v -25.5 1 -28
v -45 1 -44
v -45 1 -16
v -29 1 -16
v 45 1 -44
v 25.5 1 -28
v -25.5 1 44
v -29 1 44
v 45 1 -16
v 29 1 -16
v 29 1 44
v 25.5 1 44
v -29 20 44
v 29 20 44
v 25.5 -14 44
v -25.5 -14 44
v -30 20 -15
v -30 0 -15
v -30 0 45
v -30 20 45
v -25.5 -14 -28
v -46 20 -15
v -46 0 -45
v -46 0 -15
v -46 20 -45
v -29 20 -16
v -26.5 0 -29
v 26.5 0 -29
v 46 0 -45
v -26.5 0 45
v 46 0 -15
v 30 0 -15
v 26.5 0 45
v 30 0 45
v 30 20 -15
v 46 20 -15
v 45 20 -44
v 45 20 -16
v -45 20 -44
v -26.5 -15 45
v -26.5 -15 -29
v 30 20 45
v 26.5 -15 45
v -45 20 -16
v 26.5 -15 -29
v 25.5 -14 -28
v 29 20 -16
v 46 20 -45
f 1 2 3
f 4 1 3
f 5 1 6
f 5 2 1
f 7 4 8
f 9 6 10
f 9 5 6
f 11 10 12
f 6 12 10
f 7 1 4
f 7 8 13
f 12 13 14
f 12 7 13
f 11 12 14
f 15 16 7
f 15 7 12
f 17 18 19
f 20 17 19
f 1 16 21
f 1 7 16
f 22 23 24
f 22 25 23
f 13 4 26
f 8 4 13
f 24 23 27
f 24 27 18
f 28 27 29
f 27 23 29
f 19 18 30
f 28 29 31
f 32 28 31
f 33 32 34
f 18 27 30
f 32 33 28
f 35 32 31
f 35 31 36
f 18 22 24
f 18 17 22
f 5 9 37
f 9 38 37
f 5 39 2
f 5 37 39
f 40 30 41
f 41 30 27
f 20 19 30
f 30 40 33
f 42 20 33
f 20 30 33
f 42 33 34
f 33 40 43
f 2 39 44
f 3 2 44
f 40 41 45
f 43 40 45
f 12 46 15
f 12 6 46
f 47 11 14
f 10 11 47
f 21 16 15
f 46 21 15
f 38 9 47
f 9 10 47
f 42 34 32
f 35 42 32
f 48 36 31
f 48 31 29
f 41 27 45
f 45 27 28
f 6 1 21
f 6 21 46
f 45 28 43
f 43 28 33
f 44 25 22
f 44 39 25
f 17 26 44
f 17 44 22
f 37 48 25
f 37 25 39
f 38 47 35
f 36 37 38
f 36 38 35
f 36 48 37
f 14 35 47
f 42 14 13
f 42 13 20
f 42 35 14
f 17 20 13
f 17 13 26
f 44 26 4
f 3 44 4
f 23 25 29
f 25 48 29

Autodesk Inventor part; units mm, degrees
ref_plane "YZ Plane" through (0, 0, 0) normal (1, 0, 0) x (0, 1, 0)
ref_plane "XZ Plane" through (0, 0, 0) normal (0, 1, 0) x (-1, 0, 0)
ref_plane "XY Plane" through (0, 0, 0) normal (0, 0, 1) x (1, 0, 0)
sketch "Sketch1" plane through (0, 0, 0) normal (0, 1, 0) x (-1, 0, 0)
  line L0 (30, 45) -> (-30, 45)
  line L1 (-30, 45) -> (-30, -45)
  line L2 (-30, -45) -> (30, -45)
  line L3 (30, -45) -> (30, 45)
  line L4 (30, 45) -> (-30, -45) construction
  line L5 (-30, 45) -> (30, -45) construction
  point P0 (0, 0)
  dimension "d0" = 90
  dimension "d1" = 60
extrude "Extrusion1" add sketch "Sketch1" along normal blind 20
sketch "Sketch2" plane through (0, 0, 0) normal (0, -1, 0) x (1, 0, 0)
  line L0 (26.5, 45) -> (-26.5, 45)
  line L1 (-26.5, 45) -> (-26.5, -29)
  line L2 (-26.5, -29) -> (26.5, -29)
  line L3 (26.5, -29) -> (26.5, 45)
  line L4 (-30, 45) -> (30, 45) projected
  point P0 (0, 0)
  dimension "d4" = 74
  dimension "d5" = 0
  dimension "d6" = 53
  dimension "d7" = 26.5
extrude "Extrusion2" add sketch "Sketch2" along normal blind 15
sketch "Sketch3" plane through (30, 0, 45) normal (1, 0, 0) x (0, 0, -1)
  line L0 (0, 0) -> (90, 0) projected
  line L1 (90, 0) -> (90, 20) projected
  line L2 (0, 20) -> (90, 20) projected
  line L3 (0, 0) -> (0, 20) projected
  line L4 (90, 0) -> (60, 0)
  line L5 (60, 0) -> (60, 20)
  line L6 (60, 20) -> (90, 20)
  line L7 (90, 20) -> (90, 0)
  point P0 (45, 0)
  dimension "d10" = 30
extrude "Extrusion3" add sketch "Sketch3" along normal blind 16 contours L5 L2 L1 L0
mirror "Mirror1" about plane through (0, 0, 0) normal (1, 0, 0) of "Extrusion3"
shell "Shell1" thickness 1 removed faces 1 at (-10, 20, 5)
ref_plane "Work Plane1" through (0, 0, 0) normal (1, 0, 0) x (0, 1, 0)
properties part number "body_bottom"
